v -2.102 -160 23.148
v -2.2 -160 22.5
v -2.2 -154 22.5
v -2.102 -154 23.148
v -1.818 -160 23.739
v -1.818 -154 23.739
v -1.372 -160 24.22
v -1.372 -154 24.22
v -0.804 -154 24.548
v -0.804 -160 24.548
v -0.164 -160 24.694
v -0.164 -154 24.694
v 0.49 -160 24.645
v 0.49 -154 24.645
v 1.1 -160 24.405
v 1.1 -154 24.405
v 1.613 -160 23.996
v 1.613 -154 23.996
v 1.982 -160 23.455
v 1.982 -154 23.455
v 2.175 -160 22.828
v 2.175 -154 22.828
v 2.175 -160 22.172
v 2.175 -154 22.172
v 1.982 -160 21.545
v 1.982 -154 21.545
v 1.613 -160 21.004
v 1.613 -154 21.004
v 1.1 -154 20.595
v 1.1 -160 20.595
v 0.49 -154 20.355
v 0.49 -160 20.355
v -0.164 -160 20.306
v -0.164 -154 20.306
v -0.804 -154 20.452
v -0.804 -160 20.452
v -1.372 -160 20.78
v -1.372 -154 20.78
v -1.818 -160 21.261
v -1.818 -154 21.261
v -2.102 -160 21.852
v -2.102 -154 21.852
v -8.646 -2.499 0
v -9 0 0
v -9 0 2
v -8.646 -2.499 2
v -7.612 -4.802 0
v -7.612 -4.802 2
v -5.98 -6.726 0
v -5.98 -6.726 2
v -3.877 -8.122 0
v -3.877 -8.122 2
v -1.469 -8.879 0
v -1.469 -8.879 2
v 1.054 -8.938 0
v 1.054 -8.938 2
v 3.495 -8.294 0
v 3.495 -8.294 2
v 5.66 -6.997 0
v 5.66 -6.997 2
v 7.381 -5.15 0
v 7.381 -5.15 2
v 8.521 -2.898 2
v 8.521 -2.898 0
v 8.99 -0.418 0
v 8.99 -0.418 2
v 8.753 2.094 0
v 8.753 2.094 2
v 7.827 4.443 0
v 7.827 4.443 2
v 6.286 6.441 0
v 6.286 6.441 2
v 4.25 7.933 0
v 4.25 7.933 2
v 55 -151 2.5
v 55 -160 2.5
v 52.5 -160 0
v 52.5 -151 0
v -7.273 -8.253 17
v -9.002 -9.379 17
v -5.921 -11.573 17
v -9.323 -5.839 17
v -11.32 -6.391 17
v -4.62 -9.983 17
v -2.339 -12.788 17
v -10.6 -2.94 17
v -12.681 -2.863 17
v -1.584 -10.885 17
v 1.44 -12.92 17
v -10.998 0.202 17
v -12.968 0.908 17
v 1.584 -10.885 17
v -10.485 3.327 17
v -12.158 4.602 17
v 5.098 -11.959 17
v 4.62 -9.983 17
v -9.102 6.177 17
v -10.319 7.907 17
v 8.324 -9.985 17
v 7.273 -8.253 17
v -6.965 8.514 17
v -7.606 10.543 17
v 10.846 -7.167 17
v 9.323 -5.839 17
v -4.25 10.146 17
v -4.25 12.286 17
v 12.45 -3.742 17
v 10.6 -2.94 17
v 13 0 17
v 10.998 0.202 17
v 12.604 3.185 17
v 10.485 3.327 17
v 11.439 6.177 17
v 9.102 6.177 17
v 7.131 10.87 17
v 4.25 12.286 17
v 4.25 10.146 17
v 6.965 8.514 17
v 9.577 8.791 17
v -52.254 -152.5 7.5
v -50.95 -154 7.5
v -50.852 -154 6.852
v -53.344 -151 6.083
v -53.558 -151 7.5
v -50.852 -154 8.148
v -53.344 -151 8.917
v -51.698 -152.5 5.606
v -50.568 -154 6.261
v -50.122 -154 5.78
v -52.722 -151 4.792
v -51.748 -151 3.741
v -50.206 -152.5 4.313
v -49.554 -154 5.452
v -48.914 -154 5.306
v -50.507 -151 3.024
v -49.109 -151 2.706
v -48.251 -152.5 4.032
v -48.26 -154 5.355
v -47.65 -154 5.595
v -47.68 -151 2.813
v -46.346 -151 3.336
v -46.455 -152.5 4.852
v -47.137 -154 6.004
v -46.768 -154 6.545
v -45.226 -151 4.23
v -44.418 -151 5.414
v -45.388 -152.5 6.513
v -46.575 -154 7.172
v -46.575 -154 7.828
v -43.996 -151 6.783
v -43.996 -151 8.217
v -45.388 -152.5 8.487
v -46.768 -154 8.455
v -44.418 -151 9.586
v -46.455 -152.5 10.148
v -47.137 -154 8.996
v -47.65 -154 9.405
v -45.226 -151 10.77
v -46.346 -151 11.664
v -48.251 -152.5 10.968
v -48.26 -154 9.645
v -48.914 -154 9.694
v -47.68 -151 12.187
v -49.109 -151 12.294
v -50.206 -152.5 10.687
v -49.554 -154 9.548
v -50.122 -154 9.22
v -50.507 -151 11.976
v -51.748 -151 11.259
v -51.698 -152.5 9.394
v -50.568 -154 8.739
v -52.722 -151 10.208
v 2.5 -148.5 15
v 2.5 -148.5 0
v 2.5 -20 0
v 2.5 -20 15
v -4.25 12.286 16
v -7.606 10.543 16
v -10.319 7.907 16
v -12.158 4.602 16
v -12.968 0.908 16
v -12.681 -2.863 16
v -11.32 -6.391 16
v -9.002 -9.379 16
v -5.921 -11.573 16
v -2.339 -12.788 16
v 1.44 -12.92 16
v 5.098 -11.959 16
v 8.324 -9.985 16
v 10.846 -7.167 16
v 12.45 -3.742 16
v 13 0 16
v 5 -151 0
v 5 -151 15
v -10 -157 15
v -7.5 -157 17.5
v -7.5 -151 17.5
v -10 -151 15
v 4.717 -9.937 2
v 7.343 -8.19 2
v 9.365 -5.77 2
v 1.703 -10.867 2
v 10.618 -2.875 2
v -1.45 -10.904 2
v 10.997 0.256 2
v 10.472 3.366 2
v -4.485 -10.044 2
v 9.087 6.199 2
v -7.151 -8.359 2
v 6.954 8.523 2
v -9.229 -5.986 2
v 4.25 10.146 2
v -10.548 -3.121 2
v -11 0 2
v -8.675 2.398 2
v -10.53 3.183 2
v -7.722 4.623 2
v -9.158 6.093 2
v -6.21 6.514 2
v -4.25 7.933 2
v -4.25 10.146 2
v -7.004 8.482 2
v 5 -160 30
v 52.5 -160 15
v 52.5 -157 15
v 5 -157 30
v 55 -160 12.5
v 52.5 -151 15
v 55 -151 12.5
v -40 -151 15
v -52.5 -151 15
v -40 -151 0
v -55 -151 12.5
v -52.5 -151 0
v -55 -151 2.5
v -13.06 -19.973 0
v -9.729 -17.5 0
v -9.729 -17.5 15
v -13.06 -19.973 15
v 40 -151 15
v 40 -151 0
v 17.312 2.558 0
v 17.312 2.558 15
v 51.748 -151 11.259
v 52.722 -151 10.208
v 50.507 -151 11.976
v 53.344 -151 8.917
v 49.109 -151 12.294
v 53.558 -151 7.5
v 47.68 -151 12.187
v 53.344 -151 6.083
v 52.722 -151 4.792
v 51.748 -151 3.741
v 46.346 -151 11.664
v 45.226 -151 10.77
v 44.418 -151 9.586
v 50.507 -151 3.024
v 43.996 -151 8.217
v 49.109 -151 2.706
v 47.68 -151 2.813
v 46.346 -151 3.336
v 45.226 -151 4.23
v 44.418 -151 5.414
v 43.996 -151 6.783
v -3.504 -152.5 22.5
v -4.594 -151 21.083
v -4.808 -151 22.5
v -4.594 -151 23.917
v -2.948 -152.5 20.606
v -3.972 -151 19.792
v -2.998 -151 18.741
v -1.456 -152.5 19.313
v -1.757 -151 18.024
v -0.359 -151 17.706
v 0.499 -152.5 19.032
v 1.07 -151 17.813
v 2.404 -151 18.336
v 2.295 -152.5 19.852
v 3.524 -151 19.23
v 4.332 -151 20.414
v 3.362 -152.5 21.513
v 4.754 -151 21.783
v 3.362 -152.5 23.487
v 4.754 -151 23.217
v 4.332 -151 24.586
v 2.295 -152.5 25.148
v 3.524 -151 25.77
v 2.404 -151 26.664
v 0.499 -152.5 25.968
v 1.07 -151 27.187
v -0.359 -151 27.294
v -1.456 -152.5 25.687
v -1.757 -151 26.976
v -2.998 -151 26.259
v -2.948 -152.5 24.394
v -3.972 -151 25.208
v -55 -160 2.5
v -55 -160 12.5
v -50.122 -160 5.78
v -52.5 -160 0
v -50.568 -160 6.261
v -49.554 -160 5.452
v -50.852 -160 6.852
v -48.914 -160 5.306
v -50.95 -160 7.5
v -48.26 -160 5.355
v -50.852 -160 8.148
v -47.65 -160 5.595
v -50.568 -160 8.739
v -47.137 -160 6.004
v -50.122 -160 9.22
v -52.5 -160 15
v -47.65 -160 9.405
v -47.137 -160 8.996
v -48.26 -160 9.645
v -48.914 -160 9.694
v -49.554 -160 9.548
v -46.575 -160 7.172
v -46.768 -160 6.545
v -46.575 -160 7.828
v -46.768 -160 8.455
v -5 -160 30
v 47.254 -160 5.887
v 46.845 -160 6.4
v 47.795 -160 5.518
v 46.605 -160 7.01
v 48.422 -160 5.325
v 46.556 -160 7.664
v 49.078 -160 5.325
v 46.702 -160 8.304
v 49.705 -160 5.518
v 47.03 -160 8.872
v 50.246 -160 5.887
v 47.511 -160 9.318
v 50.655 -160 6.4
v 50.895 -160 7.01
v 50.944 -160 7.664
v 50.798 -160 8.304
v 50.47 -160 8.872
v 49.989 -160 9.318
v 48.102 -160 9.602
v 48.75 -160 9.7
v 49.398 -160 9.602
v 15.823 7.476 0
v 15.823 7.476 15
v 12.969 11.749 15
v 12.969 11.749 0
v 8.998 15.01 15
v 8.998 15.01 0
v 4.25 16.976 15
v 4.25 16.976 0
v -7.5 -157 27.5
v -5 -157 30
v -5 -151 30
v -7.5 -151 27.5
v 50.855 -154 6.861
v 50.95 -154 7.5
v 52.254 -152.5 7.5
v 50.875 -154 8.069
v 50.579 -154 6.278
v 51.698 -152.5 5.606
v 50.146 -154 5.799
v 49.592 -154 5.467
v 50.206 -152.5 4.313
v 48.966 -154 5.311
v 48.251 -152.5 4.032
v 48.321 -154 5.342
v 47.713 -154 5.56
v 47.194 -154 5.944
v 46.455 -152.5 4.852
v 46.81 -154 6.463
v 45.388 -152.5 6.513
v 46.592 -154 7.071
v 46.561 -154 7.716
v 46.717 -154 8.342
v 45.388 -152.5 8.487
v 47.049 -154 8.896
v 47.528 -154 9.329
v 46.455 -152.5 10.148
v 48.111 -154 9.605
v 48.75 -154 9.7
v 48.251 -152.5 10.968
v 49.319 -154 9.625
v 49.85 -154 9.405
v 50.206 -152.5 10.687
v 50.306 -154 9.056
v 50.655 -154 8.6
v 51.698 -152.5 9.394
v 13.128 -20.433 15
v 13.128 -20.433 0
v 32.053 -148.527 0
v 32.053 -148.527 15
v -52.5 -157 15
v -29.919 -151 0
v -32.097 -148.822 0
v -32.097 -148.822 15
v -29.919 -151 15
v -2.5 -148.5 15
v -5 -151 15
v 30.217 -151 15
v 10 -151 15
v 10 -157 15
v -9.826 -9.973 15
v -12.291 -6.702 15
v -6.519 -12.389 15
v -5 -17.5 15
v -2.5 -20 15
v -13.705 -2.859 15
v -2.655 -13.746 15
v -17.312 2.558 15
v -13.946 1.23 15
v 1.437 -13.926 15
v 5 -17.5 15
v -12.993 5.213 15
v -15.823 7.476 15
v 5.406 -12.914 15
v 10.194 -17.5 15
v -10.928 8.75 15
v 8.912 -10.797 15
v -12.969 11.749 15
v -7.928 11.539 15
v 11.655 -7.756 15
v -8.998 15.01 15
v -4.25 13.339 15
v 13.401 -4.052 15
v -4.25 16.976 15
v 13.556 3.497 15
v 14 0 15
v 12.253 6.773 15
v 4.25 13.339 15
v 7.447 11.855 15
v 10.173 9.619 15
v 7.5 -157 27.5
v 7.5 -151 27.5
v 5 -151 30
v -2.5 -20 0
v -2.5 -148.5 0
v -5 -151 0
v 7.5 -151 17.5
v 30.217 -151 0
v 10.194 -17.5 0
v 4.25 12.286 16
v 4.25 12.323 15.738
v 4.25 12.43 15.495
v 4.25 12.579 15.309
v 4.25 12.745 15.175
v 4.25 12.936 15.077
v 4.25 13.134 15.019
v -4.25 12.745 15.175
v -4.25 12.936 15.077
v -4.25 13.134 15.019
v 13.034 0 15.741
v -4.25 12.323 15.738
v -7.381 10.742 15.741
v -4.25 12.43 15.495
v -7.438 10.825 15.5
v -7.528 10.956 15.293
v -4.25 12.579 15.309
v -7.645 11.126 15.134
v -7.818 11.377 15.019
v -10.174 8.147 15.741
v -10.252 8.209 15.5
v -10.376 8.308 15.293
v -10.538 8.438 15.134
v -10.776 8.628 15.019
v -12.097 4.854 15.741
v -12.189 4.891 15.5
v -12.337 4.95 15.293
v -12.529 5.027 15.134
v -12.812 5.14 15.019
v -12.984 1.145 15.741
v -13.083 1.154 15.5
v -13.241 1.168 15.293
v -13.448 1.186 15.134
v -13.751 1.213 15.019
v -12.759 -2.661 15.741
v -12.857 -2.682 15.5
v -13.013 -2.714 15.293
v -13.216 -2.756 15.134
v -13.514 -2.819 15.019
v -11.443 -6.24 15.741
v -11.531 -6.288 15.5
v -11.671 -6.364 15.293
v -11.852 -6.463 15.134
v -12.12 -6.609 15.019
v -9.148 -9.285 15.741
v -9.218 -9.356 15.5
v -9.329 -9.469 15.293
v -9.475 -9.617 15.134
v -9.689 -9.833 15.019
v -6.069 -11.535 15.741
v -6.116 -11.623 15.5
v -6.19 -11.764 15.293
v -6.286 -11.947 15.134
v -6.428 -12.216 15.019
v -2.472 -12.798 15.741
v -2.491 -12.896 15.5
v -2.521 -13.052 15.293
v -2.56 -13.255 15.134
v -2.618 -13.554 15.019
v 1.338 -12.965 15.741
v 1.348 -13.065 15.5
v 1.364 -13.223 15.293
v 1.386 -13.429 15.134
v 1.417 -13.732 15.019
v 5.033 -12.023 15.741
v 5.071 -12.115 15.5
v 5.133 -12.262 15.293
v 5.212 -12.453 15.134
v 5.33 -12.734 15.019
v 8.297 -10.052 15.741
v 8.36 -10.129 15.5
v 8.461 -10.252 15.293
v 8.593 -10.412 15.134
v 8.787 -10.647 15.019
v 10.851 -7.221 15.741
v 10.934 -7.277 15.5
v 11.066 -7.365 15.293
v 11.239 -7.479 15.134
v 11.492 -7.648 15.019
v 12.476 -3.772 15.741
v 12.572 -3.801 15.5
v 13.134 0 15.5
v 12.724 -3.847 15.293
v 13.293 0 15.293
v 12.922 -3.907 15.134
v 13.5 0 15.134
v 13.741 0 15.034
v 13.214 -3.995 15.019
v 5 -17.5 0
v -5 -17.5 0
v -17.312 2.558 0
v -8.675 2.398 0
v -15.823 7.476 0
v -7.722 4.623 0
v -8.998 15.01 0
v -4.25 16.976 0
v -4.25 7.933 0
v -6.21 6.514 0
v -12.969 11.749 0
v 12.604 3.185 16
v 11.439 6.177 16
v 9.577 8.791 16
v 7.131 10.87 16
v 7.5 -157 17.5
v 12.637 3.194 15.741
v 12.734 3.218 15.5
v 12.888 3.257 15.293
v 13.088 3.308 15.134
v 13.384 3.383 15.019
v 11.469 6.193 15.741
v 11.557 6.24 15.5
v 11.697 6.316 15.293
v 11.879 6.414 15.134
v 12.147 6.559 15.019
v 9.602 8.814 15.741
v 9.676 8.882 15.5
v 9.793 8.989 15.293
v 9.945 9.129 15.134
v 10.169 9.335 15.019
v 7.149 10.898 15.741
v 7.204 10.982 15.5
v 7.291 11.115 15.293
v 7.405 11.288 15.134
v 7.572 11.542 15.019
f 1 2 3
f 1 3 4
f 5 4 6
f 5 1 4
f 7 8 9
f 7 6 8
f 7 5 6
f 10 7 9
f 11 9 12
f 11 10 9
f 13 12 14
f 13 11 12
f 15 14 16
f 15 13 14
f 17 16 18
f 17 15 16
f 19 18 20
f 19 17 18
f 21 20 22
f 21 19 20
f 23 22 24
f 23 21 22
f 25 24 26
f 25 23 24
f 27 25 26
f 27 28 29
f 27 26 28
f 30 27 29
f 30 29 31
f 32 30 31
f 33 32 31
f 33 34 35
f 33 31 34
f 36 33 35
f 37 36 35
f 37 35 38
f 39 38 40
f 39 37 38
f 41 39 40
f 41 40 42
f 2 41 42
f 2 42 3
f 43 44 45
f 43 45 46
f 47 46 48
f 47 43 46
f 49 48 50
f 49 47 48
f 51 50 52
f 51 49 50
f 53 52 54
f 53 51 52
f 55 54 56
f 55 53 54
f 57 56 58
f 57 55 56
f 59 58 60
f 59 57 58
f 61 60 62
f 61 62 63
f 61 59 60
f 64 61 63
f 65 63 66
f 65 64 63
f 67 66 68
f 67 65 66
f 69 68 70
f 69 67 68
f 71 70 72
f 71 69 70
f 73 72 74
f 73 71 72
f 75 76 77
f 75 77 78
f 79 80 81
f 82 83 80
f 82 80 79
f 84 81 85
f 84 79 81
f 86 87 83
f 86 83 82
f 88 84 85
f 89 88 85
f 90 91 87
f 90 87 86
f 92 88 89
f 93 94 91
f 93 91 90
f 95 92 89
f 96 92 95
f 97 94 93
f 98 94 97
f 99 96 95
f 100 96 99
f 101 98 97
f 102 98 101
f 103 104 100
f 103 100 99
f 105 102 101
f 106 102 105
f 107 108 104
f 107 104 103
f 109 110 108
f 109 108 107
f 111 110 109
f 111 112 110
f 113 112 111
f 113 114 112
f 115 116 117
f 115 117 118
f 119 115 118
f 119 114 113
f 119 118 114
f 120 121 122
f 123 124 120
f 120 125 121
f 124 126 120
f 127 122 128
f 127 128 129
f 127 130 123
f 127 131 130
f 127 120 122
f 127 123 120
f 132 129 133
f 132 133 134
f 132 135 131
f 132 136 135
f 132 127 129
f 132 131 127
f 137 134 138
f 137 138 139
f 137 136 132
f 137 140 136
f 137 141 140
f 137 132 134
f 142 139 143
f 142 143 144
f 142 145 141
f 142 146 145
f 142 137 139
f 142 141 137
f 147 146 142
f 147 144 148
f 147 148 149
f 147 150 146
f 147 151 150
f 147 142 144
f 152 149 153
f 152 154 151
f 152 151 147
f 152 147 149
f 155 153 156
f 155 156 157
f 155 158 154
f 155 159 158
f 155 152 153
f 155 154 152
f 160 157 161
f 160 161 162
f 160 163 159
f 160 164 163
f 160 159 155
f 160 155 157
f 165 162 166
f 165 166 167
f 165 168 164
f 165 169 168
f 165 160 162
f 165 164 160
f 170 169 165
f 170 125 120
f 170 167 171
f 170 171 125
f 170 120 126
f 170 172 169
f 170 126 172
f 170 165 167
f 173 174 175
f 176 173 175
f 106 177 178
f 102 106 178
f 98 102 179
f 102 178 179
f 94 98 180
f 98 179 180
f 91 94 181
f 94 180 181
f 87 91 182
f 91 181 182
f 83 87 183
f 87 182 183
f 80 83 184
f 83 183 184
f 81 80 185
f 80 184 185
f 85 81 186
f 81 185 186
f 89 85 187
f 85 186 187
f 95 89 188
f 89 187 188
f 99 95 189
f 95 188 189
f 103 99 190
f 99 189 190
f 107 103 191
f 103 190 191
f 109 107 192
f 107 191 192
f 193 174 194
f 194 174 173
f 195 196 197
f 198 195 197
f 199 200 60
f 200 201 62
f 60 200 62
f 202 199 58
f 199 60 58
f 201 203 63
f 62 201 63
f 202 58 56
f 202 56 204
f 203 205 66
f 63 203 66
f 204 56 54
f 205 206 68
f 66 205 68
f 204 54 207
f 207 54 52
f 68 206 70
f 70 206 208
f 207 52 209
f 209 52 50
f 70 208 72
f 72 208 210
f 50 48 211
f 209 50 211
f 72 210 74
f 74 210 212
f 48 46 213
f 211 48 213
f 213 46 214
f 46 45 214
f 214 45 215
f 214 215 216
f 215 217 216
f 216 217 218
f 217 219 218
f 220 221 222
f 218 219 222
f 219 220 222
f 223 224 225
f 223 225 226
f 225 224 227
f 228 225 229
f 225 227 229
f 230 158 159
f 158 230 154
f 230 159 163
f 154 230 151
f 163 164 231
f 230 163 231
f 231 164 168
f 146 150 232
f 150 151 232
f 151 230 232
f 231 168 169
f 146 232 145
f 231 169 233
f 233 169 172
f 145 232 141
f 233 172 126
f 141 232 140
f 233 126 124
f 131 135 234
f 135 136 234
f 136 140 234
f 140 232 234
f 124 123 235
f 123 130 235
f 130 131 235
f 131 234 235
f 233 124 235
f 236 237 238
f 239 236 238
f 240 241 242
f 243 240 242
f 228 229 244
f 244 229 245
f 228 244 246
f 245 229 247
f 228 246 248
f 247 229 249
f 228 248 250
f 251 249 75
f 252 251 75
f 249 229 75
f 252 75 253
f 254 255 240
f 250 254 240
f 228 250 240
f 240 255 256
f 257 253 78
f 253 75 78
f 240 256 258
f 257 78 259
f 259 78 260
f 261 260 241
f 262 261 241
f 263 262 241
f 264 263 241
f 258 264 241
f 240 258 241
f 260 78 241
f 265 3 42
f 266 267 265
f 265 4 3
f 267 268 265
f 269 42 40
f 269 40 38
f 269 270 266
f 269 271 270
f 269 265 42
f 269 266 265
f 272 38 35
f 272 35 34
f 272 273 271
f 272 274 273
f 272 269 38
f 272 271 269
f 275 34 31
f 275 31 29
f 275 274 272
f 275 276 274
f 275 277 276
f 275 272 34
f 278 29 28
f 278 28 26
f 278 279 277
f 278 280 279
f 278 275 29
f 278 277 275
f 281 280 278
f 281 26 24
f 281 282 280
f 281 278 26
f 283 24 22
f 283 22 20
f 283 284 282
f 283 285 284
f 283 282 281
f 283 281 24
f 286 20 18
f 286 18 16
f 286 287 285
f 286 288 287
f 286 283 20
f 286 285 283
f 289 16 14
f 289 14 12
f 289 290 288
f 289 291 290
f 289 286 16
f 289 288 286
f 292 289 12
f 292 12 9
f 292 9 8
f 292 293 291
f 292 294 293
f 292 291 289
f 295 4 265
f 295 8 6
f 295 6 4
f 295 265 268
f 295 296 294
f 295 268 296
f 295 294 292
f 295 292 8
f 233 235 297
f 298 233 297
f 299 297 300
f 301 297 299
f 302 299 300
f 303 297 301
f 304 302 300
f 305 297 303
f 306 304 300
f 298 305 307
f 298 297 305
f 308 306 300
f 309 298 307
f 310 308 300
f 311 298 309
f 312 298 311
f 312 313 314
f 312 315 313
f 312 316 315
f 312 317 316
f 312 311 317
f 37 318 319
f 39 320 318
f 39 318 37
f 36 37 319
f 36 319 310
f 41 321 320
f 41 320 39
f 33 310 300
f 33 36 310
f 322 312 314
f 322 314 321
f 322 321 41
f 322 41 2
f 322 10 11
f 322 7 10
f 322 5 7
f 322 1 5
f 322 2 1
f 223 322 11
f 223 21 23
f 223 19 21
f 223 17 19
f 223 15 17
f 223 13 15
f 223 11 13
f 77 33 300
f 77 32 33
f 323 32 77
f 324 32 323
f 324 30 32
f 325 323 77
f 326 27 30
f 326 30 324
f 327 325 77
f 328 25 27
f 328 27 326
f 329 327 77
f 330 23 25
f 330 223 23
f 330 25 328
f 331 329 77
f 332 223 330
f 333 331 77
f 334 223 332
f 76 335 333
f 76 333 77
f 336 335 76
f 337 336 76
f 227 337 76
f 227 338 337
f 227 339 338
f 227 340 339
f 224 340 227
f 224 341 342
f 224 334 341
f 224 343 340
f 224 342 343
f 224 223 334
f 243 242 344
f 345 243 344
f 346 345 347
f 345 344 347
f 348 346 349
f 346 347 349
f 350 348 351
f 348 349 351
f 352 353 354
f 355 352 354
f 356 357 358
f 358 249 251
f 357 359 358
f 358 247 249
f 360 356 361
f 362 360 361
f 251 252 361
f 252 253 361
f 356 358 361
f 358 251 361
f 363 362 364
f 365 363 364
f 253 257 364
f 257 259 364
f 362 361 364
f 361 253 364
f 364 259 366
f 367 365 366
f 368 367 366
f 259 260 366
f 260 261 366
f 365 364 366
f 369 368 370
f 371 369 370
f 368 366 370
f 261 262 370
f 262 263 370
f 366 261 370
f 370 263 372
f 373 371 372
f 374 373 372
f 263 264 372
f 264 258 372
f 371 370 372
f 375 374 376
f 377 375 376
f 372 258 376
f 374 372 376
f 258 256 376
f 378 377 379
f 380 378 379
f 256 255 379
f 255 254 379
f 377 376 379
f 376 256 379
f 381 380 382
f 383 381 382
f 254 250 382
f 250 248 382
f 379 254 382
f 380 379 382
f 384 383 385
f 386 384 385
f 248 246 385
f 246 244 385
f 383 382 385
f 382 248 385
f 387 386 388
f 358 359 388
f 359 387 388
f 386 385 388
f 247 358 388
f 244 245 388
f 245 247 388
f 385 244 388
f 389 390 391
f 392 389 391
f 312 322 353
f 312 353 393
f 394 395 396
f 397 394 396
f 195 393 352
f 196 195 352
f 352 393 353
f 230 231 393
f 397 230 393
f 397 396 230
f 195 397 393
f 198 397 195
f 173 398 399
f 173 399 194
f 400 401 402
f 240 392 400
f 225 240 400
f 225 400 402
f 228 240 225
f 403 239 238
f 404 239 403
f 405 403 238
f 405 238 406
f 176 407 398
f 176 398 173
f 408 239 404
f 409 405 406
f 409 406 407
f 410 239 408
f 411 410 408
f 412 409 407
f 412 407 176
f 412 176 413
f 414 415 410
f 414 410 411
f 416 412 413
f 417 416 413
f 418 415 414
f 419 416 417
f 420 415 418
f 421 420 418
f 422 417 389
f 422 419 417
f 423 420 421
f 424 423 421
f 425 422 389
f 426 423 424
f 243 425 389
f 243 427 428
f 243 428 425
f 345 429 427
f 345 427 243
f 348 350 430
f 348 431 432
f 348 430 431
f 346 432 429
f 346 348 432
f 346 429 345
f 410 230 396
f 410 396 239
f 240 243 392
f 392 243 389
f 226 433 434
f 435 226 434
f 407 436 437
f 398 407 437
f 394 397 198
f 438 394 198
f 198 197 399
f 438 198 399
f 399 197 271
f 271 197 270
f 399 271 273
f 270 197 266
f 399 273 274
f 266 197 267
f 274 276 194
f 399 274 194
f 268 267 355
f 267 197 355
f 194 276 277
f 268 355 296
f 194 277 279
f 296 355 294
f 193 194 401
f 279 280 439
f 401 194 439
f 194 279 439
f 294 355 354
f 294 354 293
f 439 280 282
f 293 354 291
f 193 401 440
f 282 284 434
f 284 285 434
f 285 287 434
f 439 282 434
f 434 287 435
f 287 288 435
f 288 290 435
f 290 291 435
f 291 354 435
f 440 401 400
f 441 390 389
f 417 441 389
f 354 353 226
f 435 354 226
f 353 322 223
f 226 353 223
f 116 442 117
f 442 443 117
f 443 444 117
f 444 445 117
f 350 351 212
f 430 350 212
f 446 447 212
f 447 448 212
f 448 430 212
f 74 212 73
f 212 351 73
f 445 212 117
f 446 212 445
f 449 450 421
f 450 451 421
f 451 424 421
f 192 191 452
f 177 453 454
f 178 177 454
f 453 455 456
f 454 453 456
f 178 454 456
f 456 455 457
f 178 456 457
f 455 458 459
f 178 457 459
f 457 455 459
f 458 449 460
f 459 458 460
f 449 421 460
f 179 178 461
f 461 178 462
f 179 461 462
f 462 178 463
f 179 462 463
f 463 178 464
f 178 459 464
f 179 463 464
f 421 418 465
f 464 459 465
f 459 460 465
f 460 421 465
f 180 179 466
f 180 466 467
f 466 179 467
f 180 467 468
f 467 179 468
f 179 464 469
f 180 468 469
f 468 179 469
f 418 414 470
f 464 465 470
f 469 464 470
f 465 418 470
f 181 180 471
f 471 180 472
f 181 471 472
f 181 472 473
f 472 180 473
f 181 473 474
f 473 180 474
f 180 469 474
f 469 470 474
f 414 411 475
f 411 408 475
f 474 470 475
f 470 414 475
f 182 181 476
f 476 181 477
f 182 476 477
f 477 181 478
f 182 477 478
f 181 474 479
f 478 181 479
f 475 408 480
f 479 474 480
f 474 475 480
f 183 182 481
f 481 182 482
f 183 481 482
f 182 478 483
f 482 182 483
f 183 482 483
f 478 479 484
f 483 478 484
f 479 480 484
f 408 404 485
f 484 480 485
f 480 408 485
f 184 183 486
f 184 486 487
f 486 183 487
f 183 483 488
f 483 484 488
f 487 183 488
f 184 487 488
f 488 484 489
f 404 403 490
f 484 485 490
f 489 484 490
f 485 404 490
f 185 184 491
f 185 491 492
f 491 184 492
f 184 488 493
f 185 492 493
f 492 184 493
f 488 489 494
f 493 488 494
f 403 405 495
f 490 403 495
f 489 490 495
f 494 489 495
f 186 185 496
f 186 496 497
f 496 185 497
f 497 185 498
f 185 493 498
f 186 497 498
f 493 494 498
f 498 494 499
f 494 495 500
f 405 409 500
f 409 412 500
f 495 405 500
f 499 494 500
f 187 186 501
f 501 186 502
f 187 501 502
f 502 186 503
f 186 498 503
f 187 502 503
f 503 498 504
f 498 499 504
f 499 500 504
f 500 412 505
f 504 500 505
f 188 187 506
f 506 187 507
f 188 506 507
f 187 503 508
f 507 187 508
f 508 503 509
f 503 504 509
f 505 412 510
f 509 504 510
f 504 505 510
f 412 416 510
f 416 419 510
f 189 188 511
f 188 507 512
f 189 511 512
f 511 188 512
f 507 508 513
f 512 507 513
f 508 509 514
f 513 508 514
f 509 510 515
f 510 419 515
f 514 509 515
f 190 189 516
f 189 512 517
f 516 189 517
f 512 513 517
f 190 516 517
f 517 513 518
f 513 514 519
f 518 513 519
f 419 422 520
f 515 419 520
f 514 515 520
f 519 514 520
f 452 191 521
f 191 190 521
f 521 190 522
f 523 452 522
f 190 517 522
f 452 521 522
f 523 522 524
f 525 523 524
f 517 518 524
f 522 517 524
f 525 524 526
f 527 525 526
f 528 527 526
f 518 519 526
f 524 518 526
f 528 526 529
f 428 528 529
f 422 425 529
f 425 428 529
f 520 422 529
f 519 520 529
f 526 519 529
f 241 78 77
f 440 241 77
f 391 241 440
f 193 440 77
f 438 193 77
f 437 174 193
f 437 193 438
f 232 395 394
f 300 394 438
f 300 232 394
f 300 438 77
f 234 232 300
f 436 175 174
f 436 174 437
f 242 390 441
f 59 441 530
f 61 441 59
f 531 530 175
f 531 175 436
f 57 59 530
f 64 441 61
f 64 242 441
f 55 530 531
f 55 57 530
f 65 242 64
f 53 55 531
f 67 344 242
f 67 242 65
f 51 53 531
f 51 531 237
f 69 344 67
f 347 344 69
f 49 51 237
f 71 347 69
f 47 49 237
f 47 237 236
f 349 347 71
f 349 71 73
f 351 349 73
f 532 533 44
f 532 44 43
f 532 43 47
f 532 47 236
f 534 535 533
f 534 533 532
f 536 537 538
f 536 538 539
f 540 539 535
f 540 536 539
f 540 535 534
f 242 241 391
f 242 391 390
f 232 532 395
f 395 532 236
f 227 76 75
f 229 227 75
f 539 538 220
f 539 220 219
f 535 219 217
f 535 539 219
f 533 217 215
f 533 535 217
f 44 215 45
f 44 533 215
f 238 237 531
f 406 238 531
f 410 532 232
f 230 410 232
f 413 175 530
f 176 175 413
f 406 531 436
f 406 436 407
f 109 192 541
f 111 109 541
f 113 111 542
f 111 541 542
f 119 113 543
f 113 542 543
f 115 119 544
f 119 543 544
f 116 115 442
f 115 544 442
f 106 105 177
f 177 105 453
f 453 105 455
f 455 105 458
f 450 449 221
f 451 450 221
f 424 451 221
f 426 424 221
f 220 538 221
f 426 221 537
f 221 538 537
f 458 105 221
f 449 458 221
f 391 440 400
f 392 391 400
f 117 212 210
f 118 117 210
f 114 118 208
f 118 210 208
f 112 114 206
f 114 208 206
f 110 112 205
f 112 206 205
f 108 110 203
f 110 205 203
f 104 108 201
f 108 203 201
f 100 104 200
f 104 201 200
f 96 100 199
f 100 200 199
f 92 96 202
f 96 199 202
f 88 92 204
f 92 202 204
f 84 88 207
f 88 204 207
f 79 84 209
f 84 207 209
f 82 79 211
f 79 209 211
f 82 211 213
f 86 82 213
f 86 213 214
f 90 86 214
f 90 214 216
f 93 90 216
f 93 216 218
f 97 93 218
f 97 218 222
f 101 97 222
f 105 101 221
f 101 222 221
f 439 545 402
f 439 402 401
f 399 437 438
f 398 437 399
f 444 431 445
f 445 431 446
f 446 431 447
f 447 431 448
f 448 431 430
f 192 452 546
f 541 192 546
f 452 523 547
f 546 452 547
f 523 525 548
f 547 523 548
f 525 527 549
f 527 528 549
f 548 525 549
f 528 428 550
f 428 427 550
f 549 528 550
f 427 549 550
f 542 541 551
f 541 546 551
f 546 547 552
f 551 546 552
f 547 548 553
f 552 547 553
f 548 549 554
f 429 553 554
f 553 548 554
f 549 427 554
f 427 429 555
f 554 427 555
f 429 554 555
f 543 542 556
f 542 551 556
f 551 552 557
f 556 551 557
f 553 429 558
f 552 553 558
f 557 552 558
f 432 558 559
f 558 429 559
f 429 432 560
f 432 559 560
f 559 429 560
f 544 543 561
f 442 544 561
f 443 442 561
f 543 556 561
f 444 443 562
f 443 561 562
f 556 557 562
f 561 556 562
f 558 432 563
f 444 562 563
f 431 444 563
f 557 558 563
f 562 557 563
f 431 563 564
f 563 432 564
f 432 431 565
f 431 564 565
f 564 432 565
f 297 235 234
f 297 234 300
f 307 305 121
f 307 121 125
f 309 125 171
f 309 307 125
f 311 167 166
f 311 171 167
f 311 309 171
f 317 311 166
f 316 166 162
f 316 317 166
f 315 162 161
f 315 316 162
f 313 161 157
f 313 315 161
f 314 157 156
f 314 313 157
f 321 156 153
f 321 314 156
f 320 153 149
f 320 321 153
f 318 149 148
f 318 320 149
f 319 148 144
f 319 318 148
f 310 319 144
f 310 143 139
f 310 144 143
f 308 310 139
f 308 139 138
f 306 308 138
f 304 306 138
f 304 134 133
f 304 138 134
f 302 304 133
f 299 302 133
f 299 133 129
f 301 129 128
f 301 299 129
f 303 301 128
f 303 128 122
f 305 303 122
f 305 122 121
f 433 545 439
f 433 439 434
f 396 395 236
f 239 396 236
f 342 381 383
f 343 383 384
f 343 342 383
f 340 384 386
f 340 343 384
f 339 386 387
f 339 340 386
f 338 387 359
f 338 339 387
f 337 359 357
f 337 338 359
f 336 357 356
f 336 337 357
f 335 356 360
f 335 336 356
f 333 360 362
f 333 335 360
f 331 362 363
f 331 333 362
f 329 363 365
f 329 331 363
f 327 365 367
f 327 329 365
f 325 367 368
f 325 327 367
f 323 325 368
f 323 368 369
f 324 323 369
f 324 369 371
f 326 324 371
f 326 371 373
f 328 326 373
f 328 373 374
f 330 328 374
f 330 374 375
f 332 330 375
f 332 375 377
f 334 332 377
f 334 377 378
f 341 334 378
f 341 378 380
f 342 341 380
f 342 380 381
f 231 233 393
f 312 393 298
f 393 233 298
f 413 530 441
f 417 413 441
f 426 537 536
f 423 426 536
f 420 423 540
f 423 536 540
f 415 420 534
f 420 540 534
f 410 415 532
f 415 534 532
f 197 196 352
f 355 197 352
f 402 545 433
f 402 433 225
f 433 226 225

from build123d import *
from OCP.BRepFilletAPI import BRepFilletAPI_MakeChamfer

# Parameters (mm, degrees)
BOSS_EXTRUDE1_DEPTH     = 15
SKETCH4_W               = 15
SKETCH4_H               = 15
BOSS_EXTRUDE2_DEPTH     = 9
CUT_EXTRUDE1_DEPTH      = 180.279015807
CUT_EXTRUDE1_DEPTH_BACK = 180.279015807
SKETCH2_R               = 2.2
SKETCH3_W               = 4.807860213
SKETCH3_H               = 184.008472667
CHAMFER1_SIZE           = 2.5
CHAMFER1_SIZE2          = 2.965251078
CHAMFER1_SIZE2_2        = 2.201823595
CHAMFER2_SIZE           = 2.5
BOSS_EXTRUDE5_DEPTH     = 3
BOSS_EXTRUDE3_DEPTH     = 2
BOSS_EXTRUDE6_DEPTH     = 2
FILLET2_R               = 1


with BuildPart() as part:
    # Sketch1 → Boss-Extrude1 (new body)
    with BuildSketch(Plane.XY):
        with BuildLine():
            Line((4.25, 16.976086121), (4.25, 10.145811944))
            ThreePointArc((4.25, 10.145811944), (0, -11), (-4.25, 10.145811944))
            Line((-4.25, 10.145811944), (-4.25, 16.976086121))
            ThreePointArc((-4.25, 16.976086121), (-12.969277239, 11.74937649), (-17.312062276, 2.557831066))
            Line((-17.312062276, 2.557831066), (-40, -151))
            Line((-40, -151), (-55, -151))
            Line((-55, -151), (-55, -160))
            Line((-55, -160), (55, -160))
            Line((55, -160), (55, -151))
            Line((55, -151), (40, -151))
            Line((40, -151), (17.312062276, 2.557831066))
            ThreePointArc((17.312062276, 2.557831066), (12.969277239, 11.74937649), (4.25, 16.976086121))
        make_face()
        Polygon((12.694157412, -17.5), (32.418580877, -151), (2.5, -151), (2.5, -17.5), align=None, mode=Mode.SUBTRACT)
        Polygon((-12.694157412, -17.5), (-2.5, -17.5), (-2.5, -151), (-32.418580877, -151), align=None, mode=Mode.SUBTRACT)
    extrude(amount=BOSS_EXTRUDE1_DEPTH)

    # Sketch4 → Boss-Extrude2 (add)
    with BuildSketch(Plane.XZ.offset(160)):
        with Locations((0, 22.5)):
            Rectangle(SKETCH4_W, SKETCH4_H)
    extrude(amount=-BOSS_EXTRUDE2_DEPTH)

    # Sketch2 → Cut-Extrude1 (cut, two sides: drawn at the far end of the back side and taken through both)
    with BuildSketch(Plane(origin=(0, -151, 0), x_dir=(1, 0, 0), z_dir=(0, 1, 0)).offset(-CUT_EXTRUDE1_DEPTH_BACK)):
        with Locations(Location((-48.75, -7.5, 0), (0, 0, 180))):
            Circle(SKETCH2_R)
        with Locations(Location((48.75, -7.5, 0), (0, 0, 270))):
            Circle(SKETCH2_R)
        with Locations(Location((0, -22.5, 0), (0, 0, 180))):
            Circle(SKETCH2_R)
    extrude(amount=CUT_EXTRUDE1_DEPTH + CUT_EXTRUDE1_DEPTH_BACK, mode=Mode.SUBTRACT)

    # Sketch3 → Cut-Revolve2 (revolve, cut)
    with BuildSketch(Plane(origin=(-48.75, 0, 0), x_dir=(0, 0, -1), z_dir=(1, 0, 0)), mode=Mode.PRIVATE) as cut_revolve2_sk:
        with Locations((-5.096069894, -58.995763666)):
            Rectangle(SKETCH3_W, SKETCH3_H)
        Polygon((-5.3, -154), (-2.692139787, -151), (-7.5, -151), (-7.5, -154), align=None)
    cut_revolve2 = revolve(cut_revolve2_sk.sketch.rotate(Axis((-48.75, -151, 7.5), (0, -1, 0)), 270), axis=Axis((-48.75, -151, 7.5), (0, -1, 0)), mode=Mode.SUBTRACT)

    # Sketch5 → Cut-Revolve3 (revolve, cut)
    with BuildSketch(Plane(origin=(0, 0, 0), x_dir=(0, 0, -1), z_dir=(1, 0, 0)), mode=Mode.PRIVATE) as cut_revolve3_sk:
        Polygon((-22.5, -151), (-22.5, -154), (-20.3, -154), (-17.692139787, -151), align=None)
    revolve(cut_revolve3_sk.sketch.rotate(Axis((0, -151, 22.5), (0, -1, 0)), 270), axis=Axis((0, -151, 22.5), (0, -1, 0)), mode=Mode.SUBTRACT)

    # Mirror1: Cut-Revolve2 across plane
    add(cut_revolve2.mirror(Plane(origin=(0, 0, 0), x_dir=(0, 0, 1), z_dir=(1, 0, 0))), mode=Mode.SUBTRACT)

    # Chamfer1: one chamfer whose edges measure the first distance from different faces: ONE call of the kernel's chamfer builder (chamfer() names one face for all edges)
    chamfer1_edges_1 = [part.edges().sort_by_distance(p)[0] for p in [
        (-2.5, -17.5, 7.5),
        (-2.5, -151, 7.5),
        (2.5, -151, 7.5),
        (2.5, -17.5, 7.5),
    ]]
    chamfer1_edges_2 = [part.edges().sort_by_distance(p)[0] for p in [
        (-12.694157412, -17.5, 7.5),
    ]]
    chamfer1_side_2 = [part.faces().sort_by_distance(p)[0] for p in [
        (-22.556369145, -84.25, 7.5),
    ]]
    chamfer1_edges_3 = [part.edges().sort_by_distance(p)[0] for p in [
        (-32.418580877, -151, 7.5),
    ]]
    chamfer1_side_3 = [part.faces().sort_by_distance(p)[0] for p in [
        (31.704168003, -151, 7.5),
    ]]
    chamfer1_edges_4 = [part.edges().sort_by_distance(p)[0] for p in [
        (32.418580877, -151, 7.5),
    ]]
    chamfer1_side_4 = [part.faces().sort_by_distance(p)[0] for p in [
        (22.556369145, -84.25, 7.5),
    ]]
    chamfer1_edges_5 = [part.edges().sort_by_distance(p)[0] for p in [
        (12.694157412, -17.5, 7.5),
    ]]
    chamfer1_side_5 = [part.faces().sort_by_distance(p)[0] for p in [
        (7.597078706, -17.5, 7.5),
    ]]
    chamfer1 = BRepFilletAPI_MakeChamfer(part.part.solid().wrapped)
    for e in chamfer1_edges_1:
        chamfer1.Add(CHAMFER1_SIZE, e.wrapped)
    for e in chamfer1_edges_2:
        chamfer1.Add(CHAMFER1_SIZE, CHAMFER1_SIZE2, e.wrapped, chamfer1_side_2[0].wrapped)  # the first distance lies on this face
    for e in chamfer1_edges_3:
        chamfer1.Add(CHAMFER1_SIZE, CHAMFER1_SIZE2_2, e.wrapped, chamfer1_side_3[0].wrapped)  # the first distance lies on this face
    for e in chamfer1_edges_4:
        chamfer1.Add(CHAMFER1_SIZE, CHAMFER1_SIZE2_2, e.wrapped, chamfer1_side_4[0].wrapped)  # the first distance lies on this face
    for e in chamfer1_edges_5:
        chamfer1.Add(CHAMFER1_SIZE, CHAMFER1_SIZE2, e.wrapped, chamfer1_side_5[0].wrapped)  # the first distance lies on this face
    add(Compound.cast(chamfer1.Shape()), mode=Mode.REPLACE)

    # Chamfer2
    chamfer2_edges = [part.edges().sort_by_distance(p)[0] for p in [
        (55, -155.5, 0),
        (-55, -155.5, 0),
        (-55, -155.5, 15),
        (55, -155.5, 15),
        (7.5, -155.5, 15),
        (7.5, -155.5, 30),
        (-7.5, -155.5, 30),
        (-7.5, -155.5, 15),
    ]]
    chamfer(chamfer2_edges, length=CHAMFER2_SIZE)

    # Sketch7 → Boss-Extrude5 (add)
    with BuildSketch(Plane.XZ.offset(160)):
        Polygon((-5, 30), (-52.5, 15), (-10, 15), (-7.5, 17.5), (-7.5, 27.5), align=None)
        Polygon((52.5, 15), (5, 30), (7.5, 27.5), (7.5, 17.5), (10, 15), align=None)
    extrude(amount=-BOSS_EXTRUDE5_DEPTH)

    # Sketch6 → Boss-Extrude3 (add)
    with BuildSketch(Plane(origin=(0, 0, 0), x_dir=(-1, 0, 0), z_dir=(0, 0, -1))):
        with BuildLine():
            Line((-4.25, 7.933315826), (-4.25, 10.145811944))
            ThreePointArc((-4.25, 10.145811944), (-6.093028803, -9.158329542), (11, 0))
            ThreePointArc((11, 0), (9.158329542, 6.093028803), (4.25, 10.145811944))
            Line((4.25, 10.145811944), (4.25, 7.933315826))
            ThreePointArc((4.25, 7.933315826), (7.721722606, 4.623310502), (9, 0))
            ThreePointArc((9, 0), (-4.623310502, -7.721722606), (-4.25, 7.933315826))
        make_face()
    extrude(amount=-BOSS_EXTRUDE3_DEPTH)

    # Sketch9 → Boss-Extrude6 (add)
    with BuildSketch(Plane.XY.offset(15)):
        with BuildLine():
            ThreePointArc((-4.25, 12.285662375), (-7.541551564, -10.588909292), (13, 0))
            ThreePointArc((13, 0), (10.588909292, 7.541551564), (4.25, 12.285662375))
            Line((4.25, 12.285662375), (4.25, 10.145811944))
            ThreePointArc((4.25, 10.145811944), (0, -11), (-4.25, 10.145811944))
            Line((-4.25, 10.145811944), (-4.25, 12.285662375))
        make_face()
    extrude(amount=BOSS_EXTRUDE6_DEPTH)

    # Fillet2
    fillet2_edges = [part.edges().sort_by_distance(p)[0] for p in [
        (-7.541551564, -10.588909292, 15),
    ]]
    fillet(fillet2_edges, radius=FILLET2_R)


solid = part.part
